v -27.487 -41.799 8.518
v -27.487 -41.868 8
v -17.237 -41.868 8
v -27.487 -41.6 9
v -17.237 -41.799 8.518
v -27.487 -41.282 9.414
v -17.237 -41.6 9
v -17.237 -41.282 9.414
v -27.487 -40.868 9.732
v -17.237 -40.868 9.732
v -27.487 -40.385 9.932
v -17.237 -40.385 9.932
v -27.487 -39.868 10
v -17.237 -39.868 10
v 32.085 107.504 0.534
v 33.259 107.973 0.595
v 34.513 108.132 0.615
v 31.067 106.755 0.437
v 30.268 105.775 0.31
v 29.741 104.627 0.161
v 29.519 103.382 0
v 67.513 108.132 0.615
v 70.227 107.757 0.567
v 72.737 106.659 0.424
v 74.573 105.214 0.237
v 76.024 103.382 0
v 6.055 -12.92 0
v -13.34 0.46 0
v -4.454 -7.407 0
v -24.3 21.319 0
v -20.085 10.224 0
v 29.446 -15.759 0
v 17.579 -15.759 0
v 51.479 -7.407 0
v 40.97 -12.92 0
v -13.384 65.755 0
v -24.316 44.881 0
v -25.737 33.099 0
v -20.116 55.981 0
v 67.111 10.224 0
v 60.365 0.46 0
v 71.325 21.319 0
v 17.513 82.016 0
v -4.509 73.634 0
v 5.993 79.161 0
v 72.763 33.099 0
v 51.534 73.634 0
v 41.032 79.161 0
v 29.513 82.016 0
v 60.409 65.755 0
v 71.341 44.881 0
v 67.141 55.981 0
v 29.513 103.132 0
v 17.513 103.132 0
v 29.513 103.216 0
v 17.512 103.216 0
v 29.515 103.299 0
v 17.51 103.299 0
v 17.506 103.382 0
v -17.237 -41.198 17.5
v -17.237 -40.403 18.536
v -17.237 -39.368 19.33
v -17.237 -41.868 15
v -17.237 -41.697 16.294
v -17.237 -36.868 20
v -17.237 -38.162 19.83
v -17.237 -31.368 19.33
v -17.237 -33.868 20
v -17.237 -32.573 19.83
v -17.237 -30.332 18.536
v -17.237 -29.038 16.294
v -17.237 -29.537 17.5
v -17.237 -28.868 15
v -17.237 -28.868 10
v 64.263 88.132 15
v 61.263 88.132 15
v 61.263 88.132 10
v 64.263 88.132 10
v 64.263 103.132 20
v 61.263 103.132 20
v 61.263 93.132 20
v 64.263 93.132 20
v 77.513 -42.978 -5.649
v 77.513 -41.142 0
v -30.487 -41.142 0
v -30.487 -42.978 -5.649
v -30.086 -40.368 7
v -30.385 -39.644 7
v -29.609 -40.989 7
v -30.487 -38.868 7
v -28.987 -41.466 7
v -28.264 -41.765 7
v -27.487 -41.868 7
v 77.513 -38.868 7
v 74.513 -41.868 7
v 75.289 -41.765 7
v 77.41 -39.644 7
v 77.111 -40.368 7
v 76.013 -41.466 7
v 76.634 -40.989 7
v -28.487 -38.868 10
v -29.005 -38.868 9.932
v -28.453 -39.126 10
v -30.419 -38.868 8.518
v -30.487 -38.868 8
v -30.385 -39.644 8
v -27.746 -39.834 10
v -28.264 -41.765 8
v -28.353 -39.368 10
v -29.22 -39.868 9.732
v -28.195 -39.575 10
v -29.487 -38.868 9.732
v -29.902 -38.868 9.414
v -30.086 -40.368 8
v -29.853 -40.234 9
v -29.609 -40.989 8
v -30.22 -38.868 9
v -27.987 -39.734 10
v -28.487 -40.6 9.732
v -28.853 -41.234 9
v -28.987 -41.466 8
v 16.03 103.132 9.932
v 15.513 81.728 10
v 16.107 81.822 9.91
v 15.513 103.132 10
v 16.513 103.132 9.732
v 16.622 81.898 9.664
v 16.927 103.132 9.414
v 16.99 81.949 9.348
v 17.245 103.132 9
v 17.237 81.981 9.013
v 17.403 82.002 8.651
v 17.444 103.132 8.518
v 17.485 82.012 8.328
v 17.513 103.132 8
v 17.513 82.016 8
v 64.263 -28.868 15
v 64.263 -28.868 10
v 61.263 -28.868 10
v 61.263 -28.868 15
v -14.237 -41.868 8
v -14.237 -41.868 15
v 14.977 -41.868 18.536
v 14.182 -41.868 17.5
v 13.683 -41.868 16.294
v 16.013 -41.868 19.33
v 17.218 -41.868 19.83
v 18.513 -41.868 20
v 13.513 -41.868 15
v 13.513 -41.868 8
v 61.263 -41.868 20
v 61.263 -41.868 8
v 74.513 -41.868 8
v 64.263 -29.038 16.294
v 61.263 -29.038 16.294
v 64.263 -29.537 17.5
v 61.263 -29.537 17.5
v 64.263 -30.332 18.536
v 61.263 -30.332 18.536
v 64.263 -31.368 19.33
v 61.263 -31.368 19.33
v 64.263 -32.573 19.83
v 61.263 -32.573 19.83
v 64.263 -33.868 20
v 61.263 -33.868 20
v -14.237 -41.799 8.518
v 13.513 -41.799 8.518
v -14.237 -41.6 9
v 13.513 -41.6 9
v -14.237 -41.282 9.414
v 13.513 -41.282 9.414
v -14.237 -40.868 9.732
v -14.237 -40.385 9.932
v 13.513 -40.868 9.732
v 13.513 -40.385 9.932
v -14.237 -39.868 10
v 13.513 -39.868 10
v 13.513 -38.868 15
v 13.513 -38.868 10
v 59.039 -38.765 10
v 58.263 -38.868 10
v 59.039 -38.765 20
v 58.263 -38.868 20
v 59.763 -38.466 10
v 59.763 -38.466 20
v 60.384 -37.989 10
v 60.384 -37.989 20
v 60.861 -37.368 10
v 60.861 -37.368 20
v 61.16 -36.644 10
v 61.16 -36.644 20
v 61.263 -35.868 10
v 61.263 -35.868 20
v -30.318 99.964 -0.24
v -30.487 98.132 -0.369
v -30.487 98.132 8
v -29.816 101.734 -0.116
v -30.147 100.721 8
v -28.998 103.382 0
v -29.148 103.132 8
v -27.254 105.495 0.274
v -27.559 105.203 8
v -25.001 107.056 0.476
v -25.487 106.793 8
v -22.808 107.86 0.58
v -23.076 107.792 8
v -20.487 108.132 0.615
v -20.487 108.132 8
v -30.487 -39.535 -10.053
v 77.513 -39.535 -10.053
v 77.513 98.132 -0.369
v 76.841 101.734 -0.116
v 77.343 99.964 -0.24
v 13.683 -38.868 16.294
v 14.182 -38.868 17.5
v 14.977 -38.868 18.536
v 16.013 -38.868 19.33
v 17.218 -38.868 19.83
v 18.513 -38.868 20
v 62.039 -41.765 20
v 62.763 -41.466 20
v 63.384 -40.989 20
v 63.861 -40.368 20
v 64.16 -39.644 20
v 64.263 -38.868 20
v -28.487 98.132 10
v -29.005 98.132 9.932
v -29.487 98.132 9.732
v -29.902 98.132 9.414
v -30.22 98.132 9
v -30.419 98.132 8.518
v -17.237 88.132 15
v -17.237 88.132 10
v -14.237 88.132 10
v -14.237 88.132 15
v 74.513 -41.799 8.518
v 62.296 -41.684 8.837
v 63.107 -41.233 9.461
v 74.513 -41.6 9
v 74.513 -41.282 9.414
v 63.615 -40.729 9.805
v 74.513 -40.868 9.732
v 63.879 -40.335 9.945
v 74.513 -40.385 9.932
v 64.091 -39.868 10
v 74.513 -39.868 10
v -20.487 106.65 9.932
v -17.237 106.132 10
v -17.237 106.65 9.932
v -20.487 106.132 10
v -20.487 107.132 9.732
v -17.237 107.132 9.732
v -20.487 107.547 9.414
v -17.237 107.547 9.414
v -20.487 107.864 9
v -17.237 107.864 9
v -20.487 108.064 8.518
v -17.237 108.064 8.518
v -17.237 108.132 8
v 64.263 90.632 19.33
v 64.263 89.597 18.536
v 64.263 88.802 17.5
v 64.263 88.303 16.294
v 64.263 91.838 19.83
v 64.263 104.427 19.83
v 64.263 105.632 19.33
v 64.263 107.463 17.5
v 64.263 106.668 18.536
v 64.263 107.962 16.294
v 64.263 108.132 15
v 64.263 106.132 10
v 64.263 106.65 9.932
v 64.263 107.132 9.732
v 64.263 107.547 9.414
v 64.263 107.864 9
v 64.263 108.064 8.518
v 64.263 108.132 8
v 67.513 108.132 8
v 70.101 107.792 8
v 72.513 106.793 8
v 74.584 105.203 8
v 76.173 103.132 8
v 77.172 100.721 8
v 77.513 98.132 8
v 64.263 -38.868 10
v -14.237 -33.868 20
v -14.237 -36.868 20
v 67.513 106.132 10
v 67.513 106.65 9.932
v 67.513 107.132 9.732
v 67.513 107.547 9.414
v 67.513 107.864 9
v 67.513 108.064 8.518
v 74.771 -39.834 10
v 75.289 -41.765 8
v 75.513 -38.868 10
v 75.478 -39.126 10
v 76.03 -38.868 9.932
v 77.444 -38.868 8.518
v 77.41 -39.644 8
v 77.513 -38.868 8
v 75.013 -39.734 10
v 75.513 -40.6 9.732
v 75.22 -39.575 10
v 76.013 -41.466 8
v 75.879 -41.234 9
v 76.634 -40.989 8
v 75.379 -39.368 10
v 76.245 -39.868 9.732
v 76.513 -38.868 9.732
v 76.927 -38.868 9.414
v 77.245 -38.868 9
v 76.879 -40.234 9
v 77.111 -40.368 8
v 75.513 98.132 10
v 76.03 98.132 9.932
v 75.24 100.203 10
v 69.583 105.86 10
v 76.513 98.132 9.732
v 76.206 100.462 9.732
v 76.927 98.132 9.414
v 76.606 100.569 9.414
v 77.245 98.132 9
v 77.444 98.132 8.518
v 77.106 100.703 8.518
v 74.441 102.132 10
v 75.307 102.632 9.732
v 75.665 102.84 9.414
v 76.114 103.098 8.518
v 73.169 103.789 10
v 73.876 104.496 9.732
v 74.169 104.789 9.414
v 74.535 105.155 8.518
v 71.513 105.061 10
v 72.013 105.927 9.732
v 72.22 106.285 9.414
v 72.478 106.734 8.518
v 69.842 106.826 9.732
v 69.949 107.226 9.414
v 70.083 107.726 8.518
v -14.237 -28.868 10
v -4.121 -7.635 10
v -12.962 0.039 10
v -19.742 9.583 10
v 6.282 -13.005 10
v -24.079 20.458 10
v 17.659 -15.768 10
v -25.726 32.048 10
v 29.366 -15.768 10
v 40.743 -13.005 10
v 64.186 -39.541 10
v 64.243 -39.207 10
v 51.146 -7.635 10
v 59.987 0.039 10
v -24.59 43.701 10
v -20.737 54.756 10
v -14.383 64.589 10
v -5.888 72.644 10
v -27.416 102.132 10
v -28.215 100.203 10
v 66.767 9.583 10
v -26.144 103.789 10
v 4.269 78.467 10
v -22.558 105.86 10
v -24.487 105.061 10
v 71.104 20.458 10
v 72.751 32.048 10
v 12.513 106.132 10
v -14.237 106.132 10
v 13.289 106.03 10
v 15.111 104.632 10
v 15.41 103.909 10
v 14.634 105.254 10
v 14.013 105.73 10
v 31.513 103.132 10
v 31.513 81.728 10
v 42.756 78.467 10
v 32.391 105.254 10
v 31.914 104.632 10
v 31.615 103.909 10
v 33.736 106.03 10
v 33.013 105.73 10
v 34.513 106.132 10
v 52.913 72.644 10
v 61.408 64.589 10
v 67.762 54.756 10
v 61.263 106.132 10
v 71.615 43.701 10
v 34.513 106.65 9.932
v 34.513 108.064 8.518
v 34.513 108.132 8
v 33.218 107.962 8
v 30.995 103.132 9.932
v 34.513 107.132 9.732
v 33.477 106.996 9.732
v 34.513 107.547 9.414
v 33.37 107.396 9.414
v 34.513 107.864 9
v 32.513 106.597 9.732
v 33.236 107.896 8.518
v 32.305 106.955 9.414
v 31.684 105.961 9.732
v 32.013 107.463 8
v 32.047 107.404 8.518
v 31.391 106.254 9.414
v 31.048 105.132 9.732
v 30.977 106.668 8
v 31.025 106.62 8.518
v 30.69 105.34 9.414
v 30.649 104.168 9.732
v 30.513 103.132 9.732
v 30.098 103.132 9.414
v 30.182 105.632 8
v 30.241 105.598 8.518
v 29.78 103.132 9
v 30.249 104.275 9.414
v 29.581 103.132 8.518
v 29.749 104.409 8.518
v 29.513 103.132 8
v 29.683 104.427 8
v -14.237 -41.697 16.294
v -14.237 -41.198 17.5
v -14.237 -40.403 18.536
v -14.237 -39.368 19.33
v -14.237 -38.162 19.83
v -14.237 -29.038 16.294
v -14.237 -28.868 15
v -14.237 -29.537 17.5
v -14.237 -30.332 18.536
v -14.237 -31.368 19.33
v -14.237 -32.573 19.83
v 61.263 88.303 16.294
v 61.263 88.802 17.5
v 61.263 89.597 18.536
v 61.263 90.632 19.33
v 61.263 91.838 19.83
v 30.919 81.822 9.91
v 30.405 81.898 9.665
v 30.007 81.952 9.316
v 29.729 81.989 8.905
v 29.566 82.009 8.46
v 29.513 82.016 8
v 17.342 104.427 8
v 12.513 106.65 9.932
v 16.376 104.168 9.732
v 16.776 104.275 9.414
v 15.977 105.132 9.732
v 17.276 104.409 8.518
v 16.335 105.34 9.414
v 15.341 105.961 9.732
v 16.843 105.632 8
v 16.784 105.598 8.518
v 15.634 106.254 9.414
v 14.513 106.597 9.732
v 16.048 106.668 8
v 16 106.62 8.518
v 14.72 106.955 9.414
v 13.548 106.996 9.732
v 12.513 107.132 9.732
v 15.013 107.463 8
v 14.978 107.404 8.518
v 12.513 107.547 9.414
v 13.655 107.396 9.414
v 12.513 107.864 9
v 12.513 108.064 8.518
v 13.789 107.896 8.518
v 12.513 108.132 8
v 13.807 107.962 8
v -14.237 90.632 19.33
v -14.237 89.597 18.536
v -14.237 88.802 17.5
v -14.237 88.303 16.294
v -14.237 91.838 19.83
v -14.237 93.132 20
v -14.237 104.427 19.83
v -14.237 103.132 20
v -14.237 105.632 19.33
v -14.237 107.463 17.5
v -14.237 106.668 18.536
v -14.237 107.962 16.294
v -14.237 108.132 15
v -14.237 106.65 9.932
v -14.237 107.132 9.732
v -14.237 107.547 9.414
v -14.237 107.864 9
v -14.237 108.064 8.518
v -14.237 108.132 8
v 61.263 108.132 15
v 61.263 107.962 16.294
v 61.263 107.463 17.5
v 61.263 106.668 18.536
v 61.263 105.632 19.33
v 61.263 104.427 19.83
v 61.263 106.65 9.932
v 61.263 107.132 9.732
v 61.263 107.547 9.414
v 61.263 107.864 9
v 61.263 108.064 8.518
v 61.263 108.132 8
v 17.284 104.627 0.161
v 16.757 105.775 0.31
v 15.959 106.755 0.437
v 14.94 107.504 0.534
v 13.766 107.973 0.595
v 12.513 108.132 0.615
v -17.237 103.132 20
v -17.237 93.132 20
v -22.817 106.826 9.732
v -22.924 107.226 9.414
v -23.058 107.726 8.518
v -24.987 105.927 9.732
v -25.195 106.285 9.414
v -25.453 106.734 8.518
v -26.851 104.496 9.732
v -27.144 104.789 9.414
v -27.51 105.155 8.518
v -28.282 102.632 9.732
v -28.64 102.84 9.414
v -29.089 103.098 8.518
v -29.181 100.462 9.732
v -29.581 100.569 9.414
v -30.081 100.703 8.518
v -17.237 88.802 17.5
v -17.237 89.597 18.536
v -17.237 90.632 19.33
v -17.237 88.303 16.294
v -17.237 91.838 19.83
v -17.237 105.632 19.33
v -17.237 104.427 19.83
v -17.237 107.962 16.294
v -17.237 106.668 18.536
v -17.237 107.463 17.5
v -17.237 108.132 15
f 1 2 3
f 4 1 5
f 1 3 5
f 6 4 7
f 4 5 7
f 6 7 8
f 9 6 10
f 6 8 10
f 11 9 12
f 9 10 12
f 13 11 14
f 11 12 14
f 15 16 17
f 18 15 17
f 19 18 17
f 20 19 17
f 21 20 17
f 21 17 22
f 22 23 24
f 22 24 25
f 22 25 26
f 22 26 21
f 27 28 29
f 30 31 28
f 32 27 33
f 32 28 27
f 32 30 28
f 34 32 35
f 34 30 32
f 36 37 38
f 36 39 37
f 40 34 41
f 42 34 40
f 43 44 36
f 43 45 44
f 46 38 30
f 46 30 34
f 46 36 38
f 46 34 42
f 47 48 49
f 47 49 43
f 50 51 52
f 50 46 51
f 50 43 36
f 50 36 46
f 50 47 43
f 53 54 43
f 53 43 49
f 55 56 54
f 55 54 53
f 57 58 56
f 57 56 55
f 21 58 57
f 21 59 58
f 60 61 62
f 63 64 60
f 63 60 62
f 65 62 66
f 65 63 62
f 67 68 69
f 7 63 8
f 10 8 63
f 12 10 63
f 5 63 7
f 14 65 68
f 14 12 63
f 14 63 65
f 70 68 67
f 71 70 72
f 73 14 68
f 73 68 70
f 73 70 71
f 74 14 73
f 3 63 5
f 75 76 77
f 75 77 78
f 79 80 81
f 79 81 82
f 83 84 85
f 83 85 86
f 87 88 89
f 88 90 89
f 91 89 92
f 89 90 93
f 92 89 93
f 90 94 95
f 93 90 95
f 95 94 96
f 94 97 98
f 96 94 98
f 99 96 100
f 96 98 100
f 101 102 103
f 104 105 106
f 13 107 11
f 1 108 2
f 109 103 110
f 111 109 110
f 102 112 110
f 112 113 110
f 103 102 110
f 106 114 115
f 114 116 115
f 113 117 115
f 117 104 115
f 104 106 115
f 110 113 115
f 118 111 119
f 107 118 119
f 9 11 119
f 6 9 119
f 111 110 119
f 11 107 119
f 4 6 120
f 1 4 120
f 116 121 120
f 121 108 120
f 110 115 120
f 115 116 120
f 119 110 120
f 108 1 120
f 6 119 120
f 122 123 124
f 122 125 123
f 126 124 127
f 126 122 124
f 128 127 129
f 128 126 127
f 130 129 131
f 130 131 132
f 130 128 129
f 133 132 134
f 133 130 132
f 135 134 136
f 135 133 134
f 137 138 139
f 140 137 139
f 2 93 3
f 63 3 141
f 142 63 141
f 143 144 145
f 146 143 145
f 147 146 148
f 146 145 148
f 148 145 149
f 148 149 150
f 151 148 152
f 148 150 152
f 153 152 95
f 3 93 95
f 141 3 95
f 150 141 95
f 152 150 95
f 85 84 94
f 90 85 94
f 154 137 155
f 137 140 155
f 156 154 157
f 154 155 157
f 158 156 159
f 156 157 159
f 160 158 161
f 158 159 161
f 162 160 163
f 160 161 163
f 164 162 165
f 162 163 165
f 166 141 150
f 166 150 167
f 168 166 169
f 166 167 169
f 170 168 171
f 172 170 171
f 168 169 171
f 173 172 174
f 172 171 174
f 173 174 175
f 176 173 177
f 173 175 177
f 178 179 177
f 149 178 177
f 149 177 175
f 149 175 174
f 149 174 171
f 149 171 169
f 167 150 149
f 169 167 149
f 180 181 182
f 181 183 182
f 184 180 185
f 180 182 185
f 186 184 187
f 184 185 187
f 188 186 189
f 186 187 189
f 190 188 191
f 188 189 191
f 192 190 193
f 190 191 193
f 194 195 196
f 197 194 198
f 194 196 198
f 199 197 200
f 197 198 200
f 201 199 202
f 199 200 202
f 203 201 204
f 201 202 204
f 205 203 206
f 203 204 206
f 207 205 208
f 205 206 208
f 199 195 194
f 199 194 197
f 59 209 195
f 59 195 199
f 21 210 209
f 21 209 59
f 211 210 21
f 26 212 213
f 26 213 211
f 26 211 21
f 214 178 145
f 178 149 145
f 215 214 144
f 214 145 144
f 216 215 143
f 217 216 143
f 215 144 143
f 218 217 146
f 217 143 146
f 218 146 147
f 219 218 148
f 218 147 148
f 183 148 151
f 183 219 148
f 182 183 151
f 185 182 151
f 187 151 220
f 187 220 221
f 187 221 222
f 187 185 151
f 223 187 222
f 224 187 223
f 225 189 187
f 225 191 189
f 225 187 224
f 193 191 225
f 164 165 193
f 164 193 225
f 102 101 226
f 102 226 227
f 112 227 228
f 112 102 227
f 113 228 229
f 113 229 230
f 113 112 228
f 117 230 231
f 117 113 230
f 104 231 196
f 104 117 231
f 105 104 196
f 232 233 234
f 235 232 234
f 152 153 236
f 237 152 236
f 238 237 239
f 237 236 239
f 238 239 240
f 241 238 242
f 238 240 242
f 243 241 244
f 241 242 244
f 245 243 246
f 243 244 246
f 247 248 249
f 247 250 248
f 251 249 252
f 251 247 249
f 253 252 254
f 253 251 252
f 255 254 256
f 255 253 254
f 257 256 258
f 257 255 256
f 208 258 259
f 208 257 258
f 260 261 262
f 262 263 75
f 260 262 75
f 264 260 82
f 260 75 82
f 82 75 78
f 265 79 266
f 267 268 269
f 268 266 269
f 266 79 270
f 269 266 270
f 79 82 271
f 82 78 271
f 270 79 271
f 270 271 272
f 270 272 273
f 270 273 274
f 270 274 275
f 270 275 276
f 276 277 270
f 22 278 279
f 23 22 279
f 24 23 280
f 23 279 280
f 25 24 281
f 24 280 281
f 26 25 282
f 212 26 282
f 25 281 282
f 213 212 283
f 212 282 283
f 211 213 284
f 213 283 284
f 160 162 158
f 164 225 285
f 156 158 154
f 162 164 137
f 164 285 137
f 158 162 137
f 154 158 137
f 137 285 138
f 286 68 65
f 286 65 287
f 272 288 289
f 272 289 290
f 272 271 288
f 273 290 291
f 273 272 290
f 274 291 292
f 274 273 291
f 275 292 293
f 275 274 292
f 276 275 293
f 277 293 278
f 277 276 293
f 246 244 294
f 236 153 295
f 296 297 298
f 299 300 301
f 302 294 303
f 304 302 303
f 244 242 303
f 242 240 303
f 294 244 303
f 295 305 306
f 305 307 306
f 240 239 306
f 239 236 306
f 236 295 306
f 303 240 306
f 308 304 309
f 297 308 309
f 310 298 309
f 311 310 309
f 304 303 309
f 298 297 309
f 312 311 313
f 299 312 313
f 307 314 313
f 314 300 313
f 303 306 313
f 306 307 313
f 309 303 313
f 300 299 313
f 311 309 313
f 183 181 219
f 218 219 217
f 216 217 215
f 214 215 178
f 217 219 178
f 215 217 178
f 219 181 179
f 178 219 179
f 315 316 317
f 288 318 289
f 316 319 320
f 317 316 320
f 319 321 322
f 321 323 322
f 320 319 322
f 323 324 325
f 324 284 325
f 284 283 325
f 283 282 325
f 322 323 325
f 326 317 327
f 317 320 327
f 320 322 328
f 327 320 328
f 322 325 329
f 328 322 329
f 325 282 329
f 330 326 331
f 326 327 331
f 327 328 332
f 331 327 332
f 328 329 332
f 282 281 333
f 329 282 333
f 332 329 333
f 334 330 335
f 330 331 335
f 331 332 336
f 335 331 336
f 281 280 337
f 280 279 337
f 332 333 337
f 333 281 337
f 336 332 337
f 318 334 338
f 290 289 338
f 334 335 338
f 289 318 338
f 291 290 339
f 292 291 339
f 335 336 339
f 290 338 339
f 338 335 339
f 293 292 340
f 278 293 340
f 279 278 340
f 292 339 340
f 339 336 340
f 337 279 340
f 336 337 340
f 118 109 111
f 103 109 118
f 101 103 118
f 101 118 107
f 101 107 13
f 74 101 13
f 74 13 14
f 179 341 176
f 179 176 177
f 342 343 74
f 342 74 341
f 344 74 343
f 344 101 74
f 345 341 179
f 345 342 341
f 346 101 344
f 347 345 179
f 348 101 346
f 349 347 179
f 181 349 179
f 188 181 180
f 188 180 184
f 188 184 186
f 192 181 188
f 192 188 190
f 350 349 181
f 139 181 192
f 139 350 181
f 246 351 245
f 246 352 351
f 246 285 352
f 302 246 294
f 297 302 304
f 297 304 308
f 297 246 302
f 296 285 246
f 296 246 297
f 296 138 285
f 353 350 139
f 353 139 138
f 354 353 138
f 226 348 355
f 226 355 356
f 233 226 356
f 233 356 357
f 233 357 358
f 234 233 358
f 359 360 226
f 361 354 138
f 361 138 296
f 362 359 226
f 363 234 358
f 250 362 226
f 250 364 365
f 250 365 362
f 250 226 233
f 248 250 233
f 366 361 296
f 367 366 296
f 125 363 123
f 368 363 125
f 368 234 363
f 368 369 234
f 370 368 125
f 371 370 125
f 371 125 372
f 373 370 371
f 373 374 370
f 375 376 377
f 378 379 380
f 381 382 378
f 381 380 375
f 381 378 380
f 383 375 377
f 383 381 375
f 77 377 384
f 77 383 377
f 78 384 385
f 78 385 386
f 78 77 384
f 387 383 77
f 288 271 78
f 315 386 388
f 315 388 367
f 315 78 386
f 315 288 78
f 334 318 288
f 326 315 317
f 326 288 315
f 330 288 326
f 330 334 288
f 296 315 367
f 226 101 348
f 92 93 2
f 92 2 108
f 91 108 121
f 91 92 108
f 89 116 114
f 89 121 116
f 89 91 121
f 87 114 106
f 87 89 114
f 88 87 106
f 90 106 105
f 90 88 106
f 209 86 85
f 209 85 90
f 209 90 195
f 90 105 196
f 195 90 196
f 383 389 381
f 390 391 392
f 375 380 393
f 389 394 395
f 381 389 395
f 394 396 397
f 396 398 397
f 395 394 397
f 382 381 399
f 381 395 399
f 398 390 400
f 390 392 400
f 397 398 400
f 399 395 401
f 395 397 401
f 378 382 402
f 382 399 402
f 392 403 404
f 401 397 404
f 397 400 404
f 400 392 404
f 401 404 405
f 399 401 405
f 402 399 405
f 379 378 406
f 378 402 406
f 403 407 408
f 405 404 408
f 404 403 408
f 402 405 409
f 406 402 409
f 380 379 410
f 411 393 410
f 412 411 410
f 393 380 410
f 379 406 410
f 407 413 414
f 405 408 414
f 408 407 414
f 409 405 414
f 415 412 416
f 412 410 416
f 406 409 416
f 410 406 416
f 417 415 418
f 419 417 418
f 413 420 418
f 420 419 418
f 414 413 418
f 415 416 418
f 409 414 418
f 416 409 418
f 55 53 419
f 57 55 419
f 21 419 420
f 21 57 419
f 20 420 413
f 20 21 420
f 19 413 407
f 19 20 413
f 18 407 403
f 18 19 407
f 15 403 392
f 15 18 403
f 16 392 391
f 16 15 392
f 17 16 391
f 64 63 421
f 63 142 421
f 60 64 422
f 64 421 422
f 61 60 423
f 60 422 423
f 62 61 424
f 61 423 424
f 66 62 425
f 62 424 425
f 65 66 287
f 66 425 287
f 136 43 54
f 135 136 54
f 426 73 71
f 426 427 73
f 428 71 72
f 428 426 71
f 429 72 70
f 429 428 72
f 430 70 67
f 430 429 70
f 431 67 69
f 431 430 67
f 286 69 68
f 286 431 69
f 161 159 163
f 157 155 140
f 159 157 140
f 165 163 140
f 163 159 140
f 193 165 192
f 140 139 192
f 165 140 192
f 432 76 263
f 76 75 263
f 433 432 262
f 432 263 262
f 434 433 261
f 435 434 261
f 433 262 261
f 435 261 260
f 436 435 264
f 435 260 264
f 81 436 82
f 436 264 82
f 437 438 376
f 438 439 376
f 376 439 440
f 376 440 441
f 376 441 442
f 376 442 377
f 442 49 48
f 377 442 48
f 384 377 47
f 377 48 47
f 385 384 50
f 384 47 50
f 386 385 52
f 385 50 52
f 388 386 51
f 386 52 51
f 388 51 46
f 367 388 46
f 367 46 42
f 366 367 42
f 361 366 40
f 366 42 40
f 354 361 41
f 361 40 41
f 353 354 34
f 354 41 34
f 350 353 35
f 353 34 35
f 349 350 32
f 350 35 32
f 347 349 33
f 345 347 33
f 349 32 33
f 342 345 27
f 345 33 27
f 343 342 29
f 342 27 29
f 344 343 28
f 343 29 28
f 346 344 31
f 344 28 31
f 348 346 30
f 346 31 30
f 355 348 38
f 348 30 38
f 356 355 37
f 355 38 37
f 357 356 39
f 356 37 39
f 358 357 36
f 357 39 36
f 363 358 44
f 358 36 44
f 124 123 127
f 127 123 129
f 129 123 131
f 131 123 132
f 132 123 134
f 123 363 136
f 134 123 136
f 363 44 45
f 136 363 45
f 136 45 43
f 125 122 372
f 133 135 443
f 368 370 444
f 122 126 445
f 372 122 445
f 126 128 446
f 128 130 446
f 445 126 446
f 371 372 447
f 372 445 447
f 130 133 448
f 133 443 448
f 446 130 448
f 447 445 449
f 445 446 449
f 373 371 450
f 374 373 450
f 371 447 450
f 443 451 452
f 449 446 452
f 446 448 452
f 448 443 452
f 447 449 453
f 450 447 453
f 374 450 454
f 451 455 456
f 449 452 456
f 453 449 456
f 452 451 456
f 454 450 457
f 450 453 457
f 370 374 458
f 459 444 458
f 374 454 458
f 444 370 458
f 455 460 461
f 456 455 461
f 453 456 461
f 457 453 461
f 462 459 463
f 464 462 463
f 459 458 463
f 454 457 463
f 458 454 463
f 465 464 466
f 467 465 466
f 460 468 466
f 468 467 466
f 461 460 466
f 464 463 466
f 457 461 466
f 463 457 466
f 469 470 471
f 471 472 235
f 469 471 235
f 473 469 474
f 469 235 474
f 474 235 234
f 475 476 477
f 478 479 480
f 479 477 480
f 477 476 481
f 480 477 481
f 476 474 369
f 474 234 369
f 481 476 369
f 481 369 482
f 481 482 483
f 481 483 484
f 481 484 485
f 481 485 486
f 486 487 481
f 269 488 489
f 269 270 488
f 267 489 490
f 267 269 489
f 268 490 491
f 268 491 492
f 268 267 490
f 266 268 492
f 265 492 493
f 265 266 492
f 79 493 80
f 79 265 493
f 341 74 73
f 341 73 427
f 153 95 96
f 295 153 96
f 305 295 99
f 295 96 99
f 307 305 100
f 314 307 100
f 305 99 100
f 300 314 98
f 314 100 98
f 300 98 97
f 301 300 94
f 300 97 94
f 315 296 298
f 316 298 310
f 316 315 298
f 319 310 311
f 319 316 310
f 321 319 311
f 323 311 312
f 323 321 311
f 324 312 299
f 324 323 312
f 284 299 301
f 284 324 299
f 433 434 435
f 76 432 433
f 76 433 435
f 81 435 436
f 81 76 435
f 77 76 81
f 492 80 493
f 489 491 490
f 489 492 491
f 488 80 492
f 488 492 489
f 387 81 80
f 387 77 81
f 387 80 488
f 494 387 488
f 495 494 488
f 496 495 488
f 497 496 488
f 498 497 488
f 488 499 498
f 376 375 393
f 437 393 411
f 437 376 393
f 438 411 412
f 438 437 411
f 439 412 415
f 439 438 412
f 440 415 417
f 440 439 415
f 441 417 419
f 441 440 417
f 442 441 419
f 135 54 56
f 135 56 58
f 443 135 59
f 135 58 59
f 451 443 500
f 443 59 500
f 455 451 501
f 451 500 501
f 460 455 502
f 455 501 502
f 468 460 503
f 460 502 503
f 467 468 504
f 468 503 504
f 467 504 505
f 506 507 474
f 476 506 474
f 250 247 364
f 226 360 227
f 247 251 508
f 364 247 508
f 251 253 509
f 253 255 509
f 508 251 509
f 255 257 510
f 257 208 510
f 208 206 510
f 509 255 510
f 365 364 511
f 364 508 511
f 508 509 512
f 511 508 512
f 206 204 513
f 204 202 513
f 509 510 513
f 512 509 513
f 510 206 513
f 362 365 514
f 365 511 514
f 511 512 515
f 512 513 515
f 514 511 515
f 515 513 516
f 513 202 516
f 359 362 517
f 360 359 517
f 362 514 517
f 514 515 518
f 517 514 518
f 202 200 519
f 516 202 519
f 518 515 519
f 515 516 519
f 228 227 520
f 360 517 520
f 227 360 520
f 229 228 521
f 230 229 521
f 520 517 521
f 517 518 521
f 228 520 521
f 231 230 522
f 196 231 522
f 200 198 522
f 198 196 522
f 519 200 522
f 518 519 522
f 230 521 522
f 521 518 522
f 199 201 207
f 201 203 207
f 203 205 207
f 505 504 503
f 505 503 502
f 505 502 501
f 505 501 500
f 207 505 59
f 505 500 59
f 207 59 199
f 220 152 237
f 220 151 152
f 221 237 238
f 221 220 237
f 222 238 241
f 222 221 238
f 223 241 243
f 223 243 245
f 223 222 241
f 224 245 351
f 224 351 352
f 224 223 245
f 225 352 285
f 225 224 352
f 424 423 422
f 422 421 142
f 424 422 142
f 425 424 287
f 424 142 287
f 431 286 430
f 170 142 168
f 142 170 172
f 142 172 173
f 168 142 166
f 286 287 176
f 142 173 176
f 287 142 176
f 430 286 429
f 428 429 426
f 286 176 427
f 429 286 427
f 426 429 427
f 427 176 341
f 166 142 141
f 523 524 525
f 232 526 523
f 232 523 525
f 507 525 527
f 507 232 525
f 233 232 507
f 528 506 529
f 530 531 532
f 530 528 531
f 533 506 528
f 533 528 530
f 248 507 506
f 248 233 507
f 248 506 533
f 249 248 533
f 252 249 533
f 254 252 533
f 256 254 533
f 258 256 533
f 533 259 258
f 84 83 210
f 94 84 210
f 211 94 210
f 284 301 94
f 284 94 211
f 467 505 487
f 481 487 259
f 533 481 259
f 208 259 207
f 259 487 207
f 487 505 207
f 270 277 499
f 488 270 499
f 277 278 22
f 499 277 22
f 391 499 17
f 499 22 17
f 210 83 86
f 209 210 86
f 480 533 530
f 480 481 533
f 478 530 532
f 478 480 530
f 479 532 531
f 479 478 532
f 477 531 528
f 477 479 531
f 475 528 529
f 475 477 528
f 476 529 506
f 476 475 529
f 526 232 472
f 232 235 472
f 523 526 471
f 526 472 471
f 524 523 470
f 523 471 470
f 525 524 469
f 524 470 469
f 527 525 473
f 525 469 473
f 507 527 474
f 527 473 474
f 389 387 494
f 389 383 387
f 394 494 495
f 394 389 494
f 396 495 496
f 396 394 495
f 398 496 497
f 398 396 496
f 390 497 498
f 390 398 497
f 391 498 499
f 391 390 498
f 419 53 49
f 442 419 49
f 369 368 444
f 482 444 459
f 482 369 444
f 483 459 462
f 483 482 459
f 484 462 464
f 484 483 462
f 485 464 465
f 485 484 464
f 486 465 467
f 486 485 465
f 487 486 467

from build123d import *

# Parameters (mm, degrees)
F1_DEPTH      = 10
F3_DEPTH      = 10
F5_DEPTH      = 112.1
F6_DEPTH      = 112.8
F7_DEPTH      = 108
F2_W          = 3
F2_H          = 20
F2_H_2        = 13
F8_DEPTH      = 10
F9_T4_DEPTH   = 34.3846000786
F9_T9_DEPTH   = 34.3846000786
F10_R         = 10
F11_R         = 5
F12_R         = 2
F13_R         = 3
F14_T2_ANGLE  = 90
F14_T4_ANGLE  = 90
F14_T8_DEPTH  = 10.5
F14_T13_DEPTH = 10.5
F15_SIZE      = 5


# Not quite as in the source:
# - a fillet or chamfer that OpenCascade refuses, or shapes differently, is made with other operations: its cross-section is extruded or revolved along the edge and cut away or added
# - a feature names something its author has since deleted; it is built from what else it names


with BuildPart() as f1:
    # F0 (on Top) → F1 (new body)
    with BuildSketch(Plane.XY):
        with BuildLine():
            Line((17.5125259459, 108.1324160099), (-30.4874740541, 108.1324160099))
            Line((-30.4874740541, 108.1324160099), (-30.4874740541, -41.8675839901))
            Line((-30.4874740541, -41.8675839901), (77.5125259459, -41.8675839901))
            Line((77.5125259459, -41.8675839901), (77.5125259459, 108.1324160099))
            Line((77.5125259459, 108.1324160099), (29.5125259459, 108.1324160099))
            Line((29.5125259459, 108.1324160099), (29.5125259459, 82.0155675041))
            ThreePointArc((29.5125259459, 82.0155675041), (23.5125259459, -16.1175839901), (17.5125259459, 82.0155675041))
            Line((17.5125259459, 82.0155675041), (17.5125259459, 108.1324160099))
        make_face()
    extrude(amount=F1_DEPTH)

    # F2 (on face) → F3 (join)
    with BuildSketch(Plane.XY.offset(10)):
        Polygon((13.5125259459, -41.8675839901), (23.5125259459, -41.8675839901), (61.2625259459, -41.8675839901), (61.2625259459, -38.8675839901), (13.5125259459, -38.8675839901), align=None)
    extrude(amount=F3_DEPTH)

    # F4 (on face) → F5 (cut)
    with BuildSketch(Plane.YZ.offset(77.5125259459)):
        Polygon((-38.8675839901, 7), (-41.8675839901, 7), (-41.8675839901, 0), (-41.1420218637, 0), align=None)
    extrude(amount=-F5_DEPTH, mode=Mode.SUBTRACT)

    # F4 (on face) → F6 (cut)
    with BuildSketch(Plane.YZ.offset(77.5125259459)):
        Polygon((108.1324160099, 0), (108.1324160099, 0.6153999214), (103.3824160099, 0), align=None)
    extrude(amount=-F6_DEPTH, mode=Mode.SUBTRACT)

    # F4 (on face) → F7 (join)
    with BuildSketch(Plane.YZ.offset(77.5125259459)):
        Polygon((-38.8675839901, 0), (-41.1420218637, 0), (-44.5225949872, -10.4043342482), (103.3824160099, 0), (-36.5935839901, 0), align=None)
    extrude(amount=-F7_DEPTH)

    # F2 (on face) → F8 (join)
    with BuildSketch(Plane.XY.offset(10)):
        with Locations((-15.7374740541, 98.1324160099)):
            Rectangle(F2_W, F2_H)
        with Locations((62.7625259459, 98.1324160099)):
            Rectangle(F2_W, F2_H)
        with Locations((-15.7374740541, -35.3675839901)):
            Rectangle(F2_W, F2_H_2)
        Polygon((61.2625259459, -38.8675839901), (61.2625259459, -41.8675839901), (64.2625259459, -41.8675839901), (64.2625259459, -28.8675839901), (61.2625259459, -28.8675839901), align=None)
    extrude(amount=F8_DEPTH)

    # F9: fillet of radius 5 on 2 edges, made by hand


with BuildPart() as f9_tool2:
    # F9_s3 → F9_t4 (new body)
    with BuildSketch(Plane.XY.offset(-11.8846000786)):
        with BuildLine():
            ThreePointArc((17.5125259459, 103.1324160099), (16.0480598518, 106.6679499158), (12.5125259459, 108.1324160099))
            Line((12.5125259459, 108.1324160099), (17.5125259459, 108.1324160099))
            Line((17.5125259459, 108.1324160099), (17.5125259459, 103.1324160099))
        make_face()
    extrude(amount=F9_T4_DEPTH)

    split(bisect_by=Plane.XY, keep=Keep.TOP)


with BuildPart() as f1_1:
    add(f1.part)

    # F9_t1: cut F9_tool2
    add(f9_tool2.part, mode=Mode.SUBTRACT)


with BuildPart() as f9_tool7:
    # F9_s8 → F9_t9 (new body)
    with BuildSketch(Plane.XY.offset(-11.8846000786)):
        with BuildLine():
            ThreePointArc((29.5125259459, 103.1324160099), (30.97699204, 106.6679499158), (34.5125259459, 108.1324160099))
            Line((34.5125259459, 108.1324160099), (29.5125259459, 108.1324160099))
            Line((29.5125259459, 108.1324160099), (29.5125259459, 103.1324160099))
        make_face()
    extrude(amount=F9_T9_DEPTH)

    split(bisect_by=Plane.XY, keep=Keep.TOP)


with BuildPart() as f1_2:
    add(f1_1.part)

    # F9_t6: cut F9_tool7
    add(f9_tool7.part, mode=Mode.SUBTRACT)

    # F10
    f10_edges = [f1_2.edges().sort_by_distance(p)[0] for p in [
        (77.512526, 108.132416, 5.3077),
        (-30.487474, 108.132416, 5.3077),
    ]]
    fillet(f10_edges, radius=F10_R)

    # F11
    f11_edges = [f1_2.edges().sort_by_distance(p)[0] for p in [
        (-15.737474, 88.132416, 20),
        (-15.737474, 108.132416, 20),
        (62.762526, 88.132416, 20),
        (62.762526, 108.132416, 20),
        (62.762526, -28.867584, 20),
        (-15.737474, -28.867584, 20),
        (-15.737474, -41.867584, 20),
        (13.512526, -40.367584, 20),
    ]]
    fillet(f11_edges, radius=F11_R)

    # F12
    f12_edges = [f1_2.edges().sort_by_distance(p)[0] for p in [
        (77.512526, 28.132416, 10),
        (-0.362474, -41.867584, 10),
        (70.887526, -41.867584, 10),
        (-23.862474, -41.867584, 10),
        (-30.487474, 28.132416, 10),
        (-27.558542, 105.203484, 10),
        (-18.862474, 108.132416, 10),
        (-0.862474, 108.132416, 10),
        (47.887526, 108.132416, 10),
        (74.583594, 105.203484, 10),
        (65.887526, 108.132416, 10),
        (30.976992, 106.66795, 10),
        (29.512526, 92.573992, 10),
        (17.512526, 92.573992, 10),
        (16.04806, 106.66795, 10),
    ]]
    fillet(f12_edges, radius=F12_R)

    # F13
    f13_edges = [f1_2.edges().sort_by_distance(p)[0] for p in [
        (64.262526, -41.867584, 15),
        (61.262526, -38.867584, 15),
    ]]
    fillet(f13_edges, radius=F13_R)

    # F14: fillet of radius 3 on 2 edges, made by hand

    # F14_s1 → F14_t2 (revolve, cut)
    with BuildSketch(Plane.XZ.offset(38.8675839901)):
        with BuildLine():
            ThreePointArc((-28.4874740541, 10), (-29.9016876165, 9.4142135624), (-30.4874740541, 8))
            Line((-30.4874740541, 8), (-30.4874740541, 10))
            Line((-30.4874740541, 10), (-28.4874740541, 10))
        make_face()
    revolve(axis=Axis((-27.4874740541, -38.8675839901, 10), (0, 0, 1)), revolution_arc=F14_T2_ANGLE, mode=Mode.SUBTRACT)

    # F14_s3 → F14_t4 (revolve, cut)
    with BuildSketch(Plane.YZ.offset(74.5125259459)):
        with BuildLine():
            ThreePointArc((-39.8675839901, 10), (-41.2817975525, 9.4142135624), (-41.8675839901, 8))
            Line((-41.8675839901, 8), (-41.8675839901, 10))
            Line((-41.8675839901, 10), (-39.8675839901, 10))
        make_face()
    revolve(axis=Axis((74.5125259459, -38.8675839901, 10), (0, 0, 1)), revolution_arc=F14_T4_ANGLE, mode=Mode.SUBTRACT)


with BuildPart() as f14_tool6:
    # F14_s7 → F14_t8 (new body)
    with BuildSketch(Plane.XY.offset(-0.5)):
        with BuildLine():
            ThreePointArc((74.5125259459, -41.8675839901), (76.6338462895, -40.9889043337), (77.5125259459, -38.8675839901))
            Line((77.5125259459, -38.8675839901), (77.5125259459, -41.8675839901))
            Line((77.5125259459, -41.8675839901), (74.5125259459, -41.8675839901))
        make_face()
    extrude(amount=F14_T8_DEPTH)

    split(bisect_by=Plane(origin=(0, -37.2133083672, 12.0913368505), x_dir=(1, 0, 0), z_dir=(0, -0.9510565163, 0.3090169944)), keep=Keep.TOP)


with BuildPart() as f1_3:
    add(f1_2.part)

    # F14_t5: cut F14_tool6
    add(f14_tool6.part, mode=Mode.SUBTRACT)


with BuildPart() as f14_tool11:
    # F14_s12 → F14_t13 (new body)
    with BuildSketch(Plane.XY.offset(-0.5)):
        with BuildLine():
            ThreePointArc((-27.4874740541, -41.8675839901), (-29.6087943977, -40.9889043337), (-30.4874740541, -38.8675839901))
            Line((-30.4874740541, -38.8675839901), (-30.4874740541, -41.8675839901))
            Line((-30.4874740541, -41.8675839901), (-27.4874740541, -41.8675839901))
        make_face()
    extrude(amount=F14_T13_DEPTH)

    split(bisect_by=Plane(origin=(0, -37.2133083672, 12.0913368505), x_dir=(1, 0, 0), z_dir=(0, -0.9510565163, 0.3090169944)), keep=Keep.TOP)


with BuildPart() as f1_4:
    add(f1_3.part)

    # F14_t10: cut F14_tool11
    add(f14_tool11.part, mode=Mode.SUBTRACT)

    # F15
    f15_edges = [f1_4.edges().sort_by_distance(p)[0] for p in [
        (23.512526, -44.522595, -10.404334),
    ]]
    chamfer(f15_edges, length=F15_SIZE)


solid = f1_4.part
